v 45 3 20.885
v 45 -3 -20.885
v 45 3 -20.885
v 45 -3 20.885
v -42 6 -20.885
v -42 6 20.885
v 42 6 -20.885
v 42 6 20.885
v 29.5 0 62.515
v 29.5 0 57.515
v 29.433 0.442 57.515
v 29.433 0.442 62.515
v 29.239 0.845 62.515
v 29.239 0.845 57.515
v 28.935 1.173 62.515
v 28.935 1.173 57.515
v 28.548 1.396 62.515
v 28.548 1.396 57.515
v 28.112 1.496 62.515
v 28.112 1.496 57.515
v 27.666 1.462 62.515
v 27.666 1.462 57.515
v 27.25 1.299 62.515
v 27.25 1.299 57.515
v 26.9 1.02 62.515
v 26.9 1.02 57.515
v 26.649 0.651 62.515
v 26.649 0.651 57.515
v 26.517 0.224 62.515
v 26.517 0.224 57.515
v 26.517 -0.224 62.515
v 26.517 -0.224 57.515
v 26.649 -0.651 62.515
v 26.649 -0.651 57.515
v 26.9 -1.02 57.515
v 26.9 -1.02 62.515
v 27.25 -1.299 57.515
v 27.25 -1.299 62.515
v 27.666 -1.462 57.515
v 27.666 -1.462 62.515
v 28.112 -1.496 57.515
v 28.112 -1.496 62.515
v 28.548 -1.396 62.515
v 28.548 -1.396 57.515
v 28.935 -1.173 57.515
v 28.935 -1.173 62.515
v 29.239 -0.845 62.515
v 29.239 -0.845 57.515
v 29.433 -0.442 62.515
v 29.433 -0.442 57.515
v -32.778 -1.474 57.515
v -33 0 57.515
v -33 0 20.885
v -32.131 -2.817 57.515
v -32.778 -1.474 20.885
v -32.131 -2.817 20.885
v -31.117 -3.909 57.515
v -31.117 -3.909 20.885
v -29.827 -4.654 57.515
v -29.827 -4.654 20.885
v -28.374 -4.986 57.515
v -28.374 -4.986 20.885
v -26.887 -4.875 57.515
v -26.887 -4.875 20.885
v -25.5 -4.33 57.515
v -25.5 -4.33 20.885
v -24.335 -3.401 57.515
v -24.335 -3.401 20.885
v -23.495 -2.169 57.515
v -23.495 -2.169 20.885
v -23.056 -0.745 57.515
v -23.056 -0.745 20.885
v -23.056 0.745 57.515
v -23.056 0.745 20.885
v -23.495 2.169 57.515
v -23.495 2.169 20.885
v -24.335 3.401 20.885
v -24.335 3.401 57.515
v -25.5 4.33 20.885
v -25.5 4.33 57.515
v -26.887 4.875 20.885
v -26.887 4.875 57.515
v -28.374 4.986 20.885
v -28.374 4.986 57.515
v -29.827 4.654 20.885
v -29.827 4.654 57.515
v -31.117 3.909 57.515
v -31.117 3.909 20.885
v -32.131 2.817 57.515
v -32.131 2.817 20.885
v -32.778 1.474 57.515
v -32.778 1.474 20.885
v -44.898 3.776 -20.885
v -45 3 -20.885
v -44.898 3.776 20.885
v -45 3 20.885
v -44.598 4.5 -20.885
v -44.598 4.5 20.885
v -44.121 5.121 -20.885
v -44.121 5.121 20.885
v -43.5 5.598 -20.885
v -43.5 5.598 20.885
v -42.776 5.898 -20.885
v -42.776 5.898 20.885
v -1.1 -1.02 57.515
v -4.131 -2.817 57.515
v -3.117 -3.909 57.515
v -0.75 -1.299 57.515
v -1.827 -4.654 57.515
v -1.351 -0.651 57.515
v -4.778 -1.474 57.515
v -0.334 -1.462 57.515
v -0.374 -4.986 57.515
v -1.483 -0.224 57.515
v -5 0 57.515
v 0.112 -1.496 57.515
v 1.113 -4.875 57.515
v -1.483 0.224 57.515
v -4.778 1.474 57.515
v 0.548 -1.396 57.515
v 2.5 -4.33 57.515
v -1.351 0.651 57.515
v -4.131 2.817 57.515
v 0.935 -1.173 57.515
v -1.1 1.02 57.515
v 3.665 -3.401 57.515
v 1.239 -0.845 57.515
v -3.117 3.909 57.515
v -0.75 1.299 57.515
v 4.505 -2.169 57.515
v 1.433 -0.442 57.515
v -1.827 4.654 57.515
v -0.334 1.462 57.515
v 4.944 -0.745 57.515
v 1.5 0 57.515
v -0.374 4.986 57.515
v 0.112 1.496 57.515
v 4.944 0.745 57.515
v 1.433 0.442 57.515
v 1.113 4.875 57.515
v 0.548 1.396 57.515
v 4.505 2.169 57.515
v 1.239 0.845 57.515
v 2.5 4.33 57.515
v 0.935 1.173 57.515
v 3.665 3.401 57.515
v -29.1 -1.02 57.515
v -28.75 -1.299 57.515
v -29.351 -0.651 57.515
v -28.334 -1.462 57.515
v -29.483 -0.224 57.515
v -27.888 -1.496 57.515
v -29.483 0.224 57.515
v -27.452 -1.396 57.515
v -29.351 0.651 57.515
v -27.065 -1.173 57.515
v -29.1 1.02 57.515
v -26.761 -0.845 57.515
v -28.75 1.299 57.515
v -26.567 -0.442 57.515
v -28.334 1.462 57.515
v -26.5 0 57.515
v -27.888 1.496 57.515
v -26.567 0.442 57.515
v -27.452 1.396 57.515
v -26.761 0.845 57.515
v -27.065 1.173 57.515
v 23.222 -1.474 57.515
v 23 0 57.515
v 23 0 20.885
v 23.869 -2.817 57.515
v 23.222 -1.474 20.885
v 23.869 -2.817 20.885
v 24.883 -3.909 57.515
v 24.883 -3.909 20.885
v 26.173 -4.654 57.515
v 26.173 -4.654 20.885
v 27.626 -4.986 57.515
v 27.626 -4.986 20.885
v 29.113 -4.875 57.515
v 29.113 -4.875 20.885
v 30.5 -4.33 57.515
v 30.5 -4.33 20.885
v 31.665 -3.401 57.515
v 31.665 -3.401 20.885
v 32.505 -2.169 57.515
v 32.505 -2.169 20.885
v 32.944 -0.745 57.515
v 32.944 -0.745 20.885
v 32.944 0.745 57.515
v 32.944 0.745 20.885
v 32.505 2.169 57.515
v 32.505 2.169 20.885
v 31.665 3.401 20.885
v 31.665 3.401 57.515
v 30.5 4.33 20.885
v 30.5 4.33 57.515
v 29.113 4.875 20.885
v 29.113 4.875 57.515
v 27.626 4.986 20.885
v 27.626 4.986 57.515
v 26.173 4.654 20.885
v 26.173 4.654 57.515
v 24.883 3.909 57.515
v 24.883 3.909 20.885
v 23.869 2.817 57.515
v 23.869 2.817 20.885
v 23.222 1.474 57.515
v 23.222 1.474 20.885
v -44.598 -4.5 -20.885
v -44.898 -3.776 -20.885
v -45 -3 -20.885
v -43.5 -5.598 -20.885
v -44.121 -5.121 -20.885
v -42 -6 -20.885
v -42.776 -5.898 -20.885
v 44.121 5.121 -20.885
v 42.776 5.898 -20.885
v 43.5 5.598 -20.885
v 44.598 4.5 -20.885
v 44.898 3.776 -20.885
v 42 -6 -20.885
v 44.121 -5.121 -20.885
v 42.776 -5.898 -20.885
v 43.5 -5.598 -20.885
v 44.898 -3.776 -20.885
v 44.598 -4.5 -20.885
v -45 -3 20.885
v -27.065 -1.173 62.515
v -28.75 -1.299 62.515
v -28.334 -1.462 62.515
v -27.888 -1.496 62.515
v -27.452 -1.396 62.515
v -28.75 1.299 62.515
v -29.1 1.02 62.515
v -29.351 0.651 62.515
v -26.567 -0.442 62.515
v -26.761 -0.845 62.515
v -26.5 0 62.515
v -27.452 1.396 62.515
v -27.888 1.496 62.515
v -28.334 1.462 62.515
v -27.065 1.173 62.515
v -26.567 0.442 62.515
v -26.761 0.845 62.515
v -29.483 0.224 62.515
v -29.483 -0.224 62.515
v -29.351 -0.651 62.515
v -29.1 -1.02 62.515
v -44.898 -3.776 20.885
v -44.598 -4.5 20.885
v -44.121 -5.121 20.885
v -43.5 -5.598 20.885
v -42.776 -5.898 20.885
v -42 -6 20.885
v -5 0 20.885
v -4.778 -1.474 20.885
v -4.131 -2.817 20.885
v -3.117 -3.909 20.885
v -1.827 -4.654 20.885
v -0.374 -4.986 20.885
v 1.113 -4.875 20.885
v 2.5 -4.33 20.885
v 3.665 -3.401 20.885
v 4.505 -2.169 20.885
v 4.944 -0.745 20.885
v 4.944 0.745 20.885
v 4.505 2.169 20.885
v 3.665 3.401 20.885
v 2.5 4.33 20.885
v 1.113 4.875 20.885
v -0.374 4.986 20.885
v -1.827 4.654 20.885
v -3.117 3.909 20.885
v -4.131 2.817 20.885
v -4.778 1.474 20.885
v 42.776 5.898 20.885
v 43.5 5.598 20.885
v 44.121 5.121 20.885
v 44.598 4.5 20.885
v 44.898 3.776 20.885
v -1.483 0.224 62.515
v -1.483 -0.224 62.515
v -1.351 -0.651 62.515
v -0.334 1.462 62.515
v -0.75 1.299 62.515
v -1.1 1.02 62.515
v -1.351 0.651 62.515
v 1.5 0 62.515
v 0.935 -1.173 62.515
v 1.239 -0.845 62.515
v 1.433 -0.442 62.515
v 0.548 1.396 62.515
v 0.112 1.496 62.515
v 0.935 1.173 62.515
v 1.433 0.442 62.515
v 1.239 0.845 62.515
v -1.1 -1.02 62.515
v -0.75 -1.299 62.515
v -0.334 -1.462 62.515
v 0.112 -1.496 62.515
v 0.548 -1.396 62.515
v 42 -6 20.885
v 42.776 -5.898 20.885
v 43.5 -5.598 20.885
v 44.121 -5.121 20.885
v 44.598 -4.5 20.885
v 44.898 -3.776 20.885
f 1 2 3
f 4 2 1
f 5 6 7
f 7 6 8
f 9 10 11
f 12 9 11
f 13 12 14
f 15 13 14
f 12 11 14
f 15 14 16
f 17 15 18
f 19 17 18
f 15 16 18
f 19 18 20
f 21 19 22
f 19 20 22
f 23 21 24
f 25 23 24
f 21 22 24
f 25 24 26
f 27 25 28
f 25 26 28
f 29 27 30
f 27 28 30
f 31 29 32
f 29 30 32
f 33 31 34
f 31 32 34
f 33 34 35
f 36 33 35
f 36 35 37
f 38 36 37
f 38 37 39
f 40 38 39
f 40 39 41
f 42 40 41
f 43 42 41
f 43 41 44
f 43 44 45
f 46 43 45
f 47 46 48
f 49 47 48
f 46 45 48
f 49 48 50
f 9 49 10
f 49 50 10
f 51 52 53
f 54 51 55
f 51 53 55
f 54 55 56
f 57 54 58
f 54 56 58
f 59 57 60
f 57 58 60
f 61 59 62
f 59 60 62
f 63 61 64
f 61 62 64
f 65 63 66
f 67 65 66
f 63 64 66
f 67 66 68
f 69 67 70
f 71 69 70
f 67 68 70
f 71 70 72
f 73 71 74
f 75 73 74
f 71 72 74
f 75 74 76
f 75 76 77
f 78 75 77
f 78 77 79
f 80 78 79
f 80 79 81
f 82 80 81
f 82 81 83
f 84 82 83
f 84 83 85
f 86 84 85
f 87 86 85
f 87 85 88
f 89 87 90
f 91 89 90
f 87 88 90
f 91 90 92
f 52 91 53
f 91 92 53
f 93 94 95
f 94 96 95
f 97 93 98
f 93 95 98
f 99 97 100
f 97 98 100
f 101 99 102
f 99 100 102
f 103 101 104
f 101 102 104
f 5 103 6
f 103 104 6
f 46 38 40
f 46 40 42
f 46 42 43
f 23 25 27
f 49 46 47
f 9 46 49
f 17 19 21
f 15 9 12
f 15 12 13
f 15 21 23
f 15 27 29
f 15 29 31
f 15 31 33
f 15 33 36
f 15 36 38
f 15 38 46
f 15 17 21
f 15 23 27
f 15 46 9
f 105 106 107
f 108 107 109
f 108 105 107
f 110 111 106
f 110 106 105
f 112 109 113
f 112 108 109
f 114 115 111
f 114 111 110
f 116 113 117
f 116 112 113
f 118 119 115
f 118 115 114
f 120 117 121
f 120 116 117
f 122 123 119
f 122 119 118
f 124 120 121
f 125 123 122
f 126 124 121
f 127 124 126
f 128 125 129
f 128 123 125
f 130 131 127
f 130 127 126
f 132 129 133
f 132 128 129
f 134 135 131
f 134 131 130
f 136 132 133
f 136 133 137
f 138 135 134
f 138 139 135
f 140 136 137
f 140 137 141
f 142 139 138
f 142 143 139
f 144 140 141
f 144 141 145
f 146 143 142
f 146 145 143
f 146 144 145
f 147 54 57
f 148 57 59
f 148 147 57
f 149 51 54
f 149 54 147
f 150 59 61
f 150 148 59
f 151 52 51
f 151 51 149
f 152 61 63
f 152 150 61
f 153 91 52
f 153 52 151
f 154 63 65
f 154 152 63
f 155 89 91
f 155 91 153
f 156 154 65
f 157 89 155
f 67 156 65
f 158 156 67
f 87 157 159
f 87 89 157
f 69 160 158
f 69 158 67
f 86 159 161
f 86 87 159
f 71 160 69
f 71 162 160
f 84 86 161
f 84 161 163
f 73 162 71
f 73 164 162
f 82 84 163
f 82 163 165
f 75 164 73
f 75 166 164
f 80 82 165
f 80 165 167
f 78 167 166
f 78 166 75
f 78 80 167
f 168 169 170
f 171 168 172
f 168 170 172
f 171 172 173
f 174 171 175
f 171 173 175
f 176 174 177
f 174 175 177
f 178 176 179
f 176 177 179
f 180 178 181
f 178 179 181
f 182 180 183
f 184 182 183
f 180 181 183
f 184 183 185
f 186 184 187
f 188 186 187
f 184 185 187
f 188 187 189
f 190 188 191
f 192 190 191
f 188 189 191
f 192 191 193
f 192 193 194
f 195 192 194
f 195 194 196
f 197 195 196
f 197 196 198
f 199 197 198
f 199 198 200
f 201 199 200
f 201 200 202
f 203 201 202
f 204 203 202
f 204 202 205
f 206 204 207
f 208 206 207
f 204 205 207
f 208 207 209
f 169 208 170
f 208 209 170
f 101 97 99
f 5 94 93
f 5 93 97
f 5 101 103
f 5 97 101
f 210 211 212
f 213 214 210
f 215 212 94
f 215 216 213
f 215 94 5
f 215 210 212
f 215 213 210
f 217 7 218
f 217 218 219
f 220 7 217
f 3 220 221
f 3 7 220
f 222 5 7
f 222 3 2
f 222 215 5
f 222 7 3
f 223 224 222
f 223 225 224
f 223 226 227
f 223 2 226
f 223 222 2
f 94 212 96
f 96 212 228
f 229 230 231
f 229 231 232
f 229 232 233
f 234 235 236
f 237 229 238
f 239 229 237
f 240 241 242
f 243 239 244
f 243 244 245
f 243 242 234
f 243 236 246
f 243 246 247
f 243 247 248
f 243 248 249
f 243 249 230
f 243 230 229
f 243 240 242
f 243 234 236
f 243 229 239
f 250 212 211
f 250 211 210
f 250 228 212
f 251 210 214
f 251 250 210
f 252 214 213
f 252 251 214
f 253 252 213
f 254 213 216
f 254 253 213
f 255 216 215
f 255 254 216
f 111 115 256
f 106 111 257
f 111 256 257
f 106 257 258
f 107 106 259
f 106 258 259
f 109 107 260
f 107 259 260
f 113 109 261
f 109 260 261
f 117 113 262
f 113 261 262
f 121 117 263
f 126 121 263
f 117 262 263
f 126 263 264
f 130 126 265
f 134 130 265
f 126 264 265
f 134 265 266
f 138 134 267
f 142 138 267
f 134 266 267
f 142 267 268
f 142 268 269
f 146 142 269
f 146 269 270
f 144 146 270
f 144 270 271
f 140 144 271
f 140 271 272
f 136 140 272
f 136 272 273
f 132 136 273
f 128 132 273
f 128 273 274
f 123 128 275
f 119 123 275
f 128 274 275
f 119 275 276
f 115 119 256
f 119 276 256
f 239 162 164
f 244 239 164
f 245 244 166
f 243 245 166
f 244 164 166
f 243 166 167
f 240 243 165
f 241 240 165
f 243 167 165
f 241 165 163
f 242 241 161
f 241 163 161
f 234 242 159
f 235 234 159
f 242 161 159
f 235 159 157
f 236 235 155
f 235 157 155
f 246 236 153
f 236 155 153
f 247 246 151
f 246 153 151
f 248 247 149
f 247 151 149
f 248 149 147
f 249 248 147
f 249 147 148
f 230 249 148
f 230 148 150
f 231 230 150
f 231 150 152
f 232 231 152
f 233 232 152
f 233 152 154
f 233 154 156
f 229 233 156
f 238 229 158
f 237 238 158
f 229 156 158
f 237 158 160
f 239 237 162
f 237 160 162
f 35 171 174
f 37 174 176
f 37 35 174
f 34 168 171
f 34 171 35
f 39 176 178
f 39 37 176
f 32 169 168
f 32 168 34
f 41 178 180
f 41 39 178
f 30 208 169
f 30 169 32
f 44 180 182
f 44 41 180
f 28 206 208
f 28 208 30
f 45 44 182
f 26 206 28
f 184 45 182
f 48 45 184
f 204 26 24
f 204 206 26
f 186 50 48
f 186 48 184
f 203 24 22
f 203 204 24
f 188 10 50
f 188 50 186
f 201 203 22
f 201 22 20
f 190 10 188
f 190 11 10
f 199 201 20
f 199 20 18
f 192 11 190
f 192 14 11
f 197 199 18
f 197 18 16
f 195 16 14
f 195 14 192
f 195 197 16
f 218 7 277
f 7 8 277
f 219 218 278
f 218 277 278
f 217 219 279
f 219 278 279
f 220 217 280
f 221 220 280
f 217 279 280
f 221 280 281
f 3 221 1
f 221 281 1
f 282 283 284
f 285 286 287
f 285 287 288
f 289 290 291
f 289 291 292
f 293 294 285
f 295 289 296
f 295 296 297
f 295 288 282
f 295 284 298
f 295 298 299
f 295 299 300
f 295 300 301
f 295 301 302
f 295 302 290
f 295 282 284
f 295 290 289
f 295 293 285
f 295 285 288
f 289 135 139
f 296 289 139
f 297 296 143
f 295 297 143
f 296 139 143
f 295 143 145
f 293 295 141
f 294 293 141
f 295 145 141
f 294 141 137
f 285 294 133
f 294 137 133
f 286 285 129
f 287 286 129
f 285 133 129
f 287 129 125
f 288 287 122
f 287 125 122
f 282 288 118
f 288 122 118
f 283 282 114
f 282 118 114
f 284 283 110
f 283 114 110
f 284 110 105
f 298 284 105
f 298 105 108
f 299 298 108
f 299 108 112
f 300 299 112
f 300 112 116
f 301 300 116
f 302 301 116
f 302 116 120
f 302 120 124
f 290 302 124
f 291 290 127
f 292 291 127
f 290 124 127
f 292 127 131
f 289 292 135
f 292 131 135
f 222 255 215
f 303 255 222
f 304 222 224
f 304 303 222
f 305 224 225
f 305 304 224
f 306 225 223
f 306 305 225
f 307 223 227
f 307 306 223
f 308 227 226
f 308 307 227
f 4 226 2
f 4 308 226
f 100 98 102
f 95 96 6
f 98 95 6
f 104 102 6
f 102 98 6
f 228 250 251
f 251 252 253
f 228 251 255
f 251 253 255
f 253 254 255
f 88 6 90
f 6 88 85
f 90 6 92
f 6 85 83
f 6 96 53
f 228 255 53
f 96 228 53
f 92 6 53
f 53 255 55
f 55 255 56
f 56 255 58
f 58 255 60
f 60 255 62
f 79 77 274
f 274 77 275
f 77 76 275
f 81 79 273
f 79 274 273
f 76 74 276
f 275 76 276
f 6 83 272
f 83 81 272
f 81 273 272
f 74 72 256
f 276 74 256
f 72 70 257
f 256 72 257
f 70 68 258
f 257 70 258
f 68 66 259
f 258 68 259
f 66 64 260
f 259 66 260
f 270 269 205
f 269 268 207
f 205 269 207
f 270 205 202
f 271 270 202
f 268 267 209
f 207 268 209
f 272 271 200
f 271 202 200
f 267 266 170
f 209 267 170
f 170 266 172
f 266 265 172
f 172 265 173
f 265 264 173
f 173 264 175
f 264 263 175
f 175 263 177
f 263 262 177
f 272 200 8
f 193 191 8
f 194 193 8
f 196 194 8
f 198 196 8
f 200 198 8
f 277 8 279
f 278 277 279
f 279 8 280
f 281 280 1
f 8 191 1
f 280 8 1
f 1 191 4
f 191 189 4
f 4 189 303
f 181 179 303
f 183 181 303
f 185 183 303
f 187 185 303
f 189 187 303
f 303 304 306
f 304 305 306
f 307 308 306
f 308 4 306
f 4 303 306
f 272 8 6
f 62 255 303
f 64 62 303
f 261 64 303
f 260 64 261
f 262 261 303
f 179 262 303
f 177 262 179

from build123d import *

# Parameters (mm, degrees)
F0_W     = 90
F0_H     = 41.77
F1_DEPTH = 6
F3_DEPTH = 36.63
F4_R     = 3
F5_R     = 1.5
F6_DEPTH = 5


with BuildPart() as f1:
    # F0 (on Front) → F1 (new body, symmetric)
    with BuildSketch(Plane.XZ):
        Rectangle(F0_W, F0_H)
    extrude(amount=F1_DEPTH, both=True)

    # F2 (on face) → F3 (join)
    with BuildSketch(Plane.XY.offset(20.885)):
        with BuildLine():
            Line((-28, 0), (-23, 0))
            ThreePointArc((-23, 0), (-28, 5), (-33, 0))
            Line((-33, 0), (-28, 0))
        make_face()
        with BuildLine():
            ThreePointArc((-33, 0), (-28, -5), (-23, 0))
            Line((-23, 0), (-28, 0))
            Line((-28, 0), (-33, 0))
        make_face()
        with BuildLine():
            Line((-5, 0), (0, 0))
            Line((0, 0), (5, 0))
            ThreePointArc((5, 0), (0, 5), (-5, 0))
        make_face()
        with BuildLine():
            Line((5, 0), (0, 0))
            Line((0, 0), (-5, 0))
            ThreePointArc((-5, 0), (0, -5), (5, 0))
        make_face()
        with BuildLine():
            ThreePointArc((33, 0), (28, 5), (23, 0))
            ThreePointArc((23, 0), (28, -5), (33, 0))
        make_face()
    extrude(amount=F3_DEPTH)

    # F4
    f4_edges = [f1.edges().sort_by_distance(p)[0] for p in [
        (45, -6, 0),
        (45, 6, 0),
        (-45, -6, 0),
        (-45, 6, 0),
    ]]
    fillet(f4_edges, radius=F4_R)

    # F5 (on face) → F6 (join)
    with BuildSketch(Plane.XY.offset(57.515)):
        with Locations((-28, 0)):
            Circle(F5_R)
        Circle(F5_R)
        with Locations((28, 0)):
            Circle(F5_R)
    extrude(amount=F6_DEPTH)


solid = f1.part
